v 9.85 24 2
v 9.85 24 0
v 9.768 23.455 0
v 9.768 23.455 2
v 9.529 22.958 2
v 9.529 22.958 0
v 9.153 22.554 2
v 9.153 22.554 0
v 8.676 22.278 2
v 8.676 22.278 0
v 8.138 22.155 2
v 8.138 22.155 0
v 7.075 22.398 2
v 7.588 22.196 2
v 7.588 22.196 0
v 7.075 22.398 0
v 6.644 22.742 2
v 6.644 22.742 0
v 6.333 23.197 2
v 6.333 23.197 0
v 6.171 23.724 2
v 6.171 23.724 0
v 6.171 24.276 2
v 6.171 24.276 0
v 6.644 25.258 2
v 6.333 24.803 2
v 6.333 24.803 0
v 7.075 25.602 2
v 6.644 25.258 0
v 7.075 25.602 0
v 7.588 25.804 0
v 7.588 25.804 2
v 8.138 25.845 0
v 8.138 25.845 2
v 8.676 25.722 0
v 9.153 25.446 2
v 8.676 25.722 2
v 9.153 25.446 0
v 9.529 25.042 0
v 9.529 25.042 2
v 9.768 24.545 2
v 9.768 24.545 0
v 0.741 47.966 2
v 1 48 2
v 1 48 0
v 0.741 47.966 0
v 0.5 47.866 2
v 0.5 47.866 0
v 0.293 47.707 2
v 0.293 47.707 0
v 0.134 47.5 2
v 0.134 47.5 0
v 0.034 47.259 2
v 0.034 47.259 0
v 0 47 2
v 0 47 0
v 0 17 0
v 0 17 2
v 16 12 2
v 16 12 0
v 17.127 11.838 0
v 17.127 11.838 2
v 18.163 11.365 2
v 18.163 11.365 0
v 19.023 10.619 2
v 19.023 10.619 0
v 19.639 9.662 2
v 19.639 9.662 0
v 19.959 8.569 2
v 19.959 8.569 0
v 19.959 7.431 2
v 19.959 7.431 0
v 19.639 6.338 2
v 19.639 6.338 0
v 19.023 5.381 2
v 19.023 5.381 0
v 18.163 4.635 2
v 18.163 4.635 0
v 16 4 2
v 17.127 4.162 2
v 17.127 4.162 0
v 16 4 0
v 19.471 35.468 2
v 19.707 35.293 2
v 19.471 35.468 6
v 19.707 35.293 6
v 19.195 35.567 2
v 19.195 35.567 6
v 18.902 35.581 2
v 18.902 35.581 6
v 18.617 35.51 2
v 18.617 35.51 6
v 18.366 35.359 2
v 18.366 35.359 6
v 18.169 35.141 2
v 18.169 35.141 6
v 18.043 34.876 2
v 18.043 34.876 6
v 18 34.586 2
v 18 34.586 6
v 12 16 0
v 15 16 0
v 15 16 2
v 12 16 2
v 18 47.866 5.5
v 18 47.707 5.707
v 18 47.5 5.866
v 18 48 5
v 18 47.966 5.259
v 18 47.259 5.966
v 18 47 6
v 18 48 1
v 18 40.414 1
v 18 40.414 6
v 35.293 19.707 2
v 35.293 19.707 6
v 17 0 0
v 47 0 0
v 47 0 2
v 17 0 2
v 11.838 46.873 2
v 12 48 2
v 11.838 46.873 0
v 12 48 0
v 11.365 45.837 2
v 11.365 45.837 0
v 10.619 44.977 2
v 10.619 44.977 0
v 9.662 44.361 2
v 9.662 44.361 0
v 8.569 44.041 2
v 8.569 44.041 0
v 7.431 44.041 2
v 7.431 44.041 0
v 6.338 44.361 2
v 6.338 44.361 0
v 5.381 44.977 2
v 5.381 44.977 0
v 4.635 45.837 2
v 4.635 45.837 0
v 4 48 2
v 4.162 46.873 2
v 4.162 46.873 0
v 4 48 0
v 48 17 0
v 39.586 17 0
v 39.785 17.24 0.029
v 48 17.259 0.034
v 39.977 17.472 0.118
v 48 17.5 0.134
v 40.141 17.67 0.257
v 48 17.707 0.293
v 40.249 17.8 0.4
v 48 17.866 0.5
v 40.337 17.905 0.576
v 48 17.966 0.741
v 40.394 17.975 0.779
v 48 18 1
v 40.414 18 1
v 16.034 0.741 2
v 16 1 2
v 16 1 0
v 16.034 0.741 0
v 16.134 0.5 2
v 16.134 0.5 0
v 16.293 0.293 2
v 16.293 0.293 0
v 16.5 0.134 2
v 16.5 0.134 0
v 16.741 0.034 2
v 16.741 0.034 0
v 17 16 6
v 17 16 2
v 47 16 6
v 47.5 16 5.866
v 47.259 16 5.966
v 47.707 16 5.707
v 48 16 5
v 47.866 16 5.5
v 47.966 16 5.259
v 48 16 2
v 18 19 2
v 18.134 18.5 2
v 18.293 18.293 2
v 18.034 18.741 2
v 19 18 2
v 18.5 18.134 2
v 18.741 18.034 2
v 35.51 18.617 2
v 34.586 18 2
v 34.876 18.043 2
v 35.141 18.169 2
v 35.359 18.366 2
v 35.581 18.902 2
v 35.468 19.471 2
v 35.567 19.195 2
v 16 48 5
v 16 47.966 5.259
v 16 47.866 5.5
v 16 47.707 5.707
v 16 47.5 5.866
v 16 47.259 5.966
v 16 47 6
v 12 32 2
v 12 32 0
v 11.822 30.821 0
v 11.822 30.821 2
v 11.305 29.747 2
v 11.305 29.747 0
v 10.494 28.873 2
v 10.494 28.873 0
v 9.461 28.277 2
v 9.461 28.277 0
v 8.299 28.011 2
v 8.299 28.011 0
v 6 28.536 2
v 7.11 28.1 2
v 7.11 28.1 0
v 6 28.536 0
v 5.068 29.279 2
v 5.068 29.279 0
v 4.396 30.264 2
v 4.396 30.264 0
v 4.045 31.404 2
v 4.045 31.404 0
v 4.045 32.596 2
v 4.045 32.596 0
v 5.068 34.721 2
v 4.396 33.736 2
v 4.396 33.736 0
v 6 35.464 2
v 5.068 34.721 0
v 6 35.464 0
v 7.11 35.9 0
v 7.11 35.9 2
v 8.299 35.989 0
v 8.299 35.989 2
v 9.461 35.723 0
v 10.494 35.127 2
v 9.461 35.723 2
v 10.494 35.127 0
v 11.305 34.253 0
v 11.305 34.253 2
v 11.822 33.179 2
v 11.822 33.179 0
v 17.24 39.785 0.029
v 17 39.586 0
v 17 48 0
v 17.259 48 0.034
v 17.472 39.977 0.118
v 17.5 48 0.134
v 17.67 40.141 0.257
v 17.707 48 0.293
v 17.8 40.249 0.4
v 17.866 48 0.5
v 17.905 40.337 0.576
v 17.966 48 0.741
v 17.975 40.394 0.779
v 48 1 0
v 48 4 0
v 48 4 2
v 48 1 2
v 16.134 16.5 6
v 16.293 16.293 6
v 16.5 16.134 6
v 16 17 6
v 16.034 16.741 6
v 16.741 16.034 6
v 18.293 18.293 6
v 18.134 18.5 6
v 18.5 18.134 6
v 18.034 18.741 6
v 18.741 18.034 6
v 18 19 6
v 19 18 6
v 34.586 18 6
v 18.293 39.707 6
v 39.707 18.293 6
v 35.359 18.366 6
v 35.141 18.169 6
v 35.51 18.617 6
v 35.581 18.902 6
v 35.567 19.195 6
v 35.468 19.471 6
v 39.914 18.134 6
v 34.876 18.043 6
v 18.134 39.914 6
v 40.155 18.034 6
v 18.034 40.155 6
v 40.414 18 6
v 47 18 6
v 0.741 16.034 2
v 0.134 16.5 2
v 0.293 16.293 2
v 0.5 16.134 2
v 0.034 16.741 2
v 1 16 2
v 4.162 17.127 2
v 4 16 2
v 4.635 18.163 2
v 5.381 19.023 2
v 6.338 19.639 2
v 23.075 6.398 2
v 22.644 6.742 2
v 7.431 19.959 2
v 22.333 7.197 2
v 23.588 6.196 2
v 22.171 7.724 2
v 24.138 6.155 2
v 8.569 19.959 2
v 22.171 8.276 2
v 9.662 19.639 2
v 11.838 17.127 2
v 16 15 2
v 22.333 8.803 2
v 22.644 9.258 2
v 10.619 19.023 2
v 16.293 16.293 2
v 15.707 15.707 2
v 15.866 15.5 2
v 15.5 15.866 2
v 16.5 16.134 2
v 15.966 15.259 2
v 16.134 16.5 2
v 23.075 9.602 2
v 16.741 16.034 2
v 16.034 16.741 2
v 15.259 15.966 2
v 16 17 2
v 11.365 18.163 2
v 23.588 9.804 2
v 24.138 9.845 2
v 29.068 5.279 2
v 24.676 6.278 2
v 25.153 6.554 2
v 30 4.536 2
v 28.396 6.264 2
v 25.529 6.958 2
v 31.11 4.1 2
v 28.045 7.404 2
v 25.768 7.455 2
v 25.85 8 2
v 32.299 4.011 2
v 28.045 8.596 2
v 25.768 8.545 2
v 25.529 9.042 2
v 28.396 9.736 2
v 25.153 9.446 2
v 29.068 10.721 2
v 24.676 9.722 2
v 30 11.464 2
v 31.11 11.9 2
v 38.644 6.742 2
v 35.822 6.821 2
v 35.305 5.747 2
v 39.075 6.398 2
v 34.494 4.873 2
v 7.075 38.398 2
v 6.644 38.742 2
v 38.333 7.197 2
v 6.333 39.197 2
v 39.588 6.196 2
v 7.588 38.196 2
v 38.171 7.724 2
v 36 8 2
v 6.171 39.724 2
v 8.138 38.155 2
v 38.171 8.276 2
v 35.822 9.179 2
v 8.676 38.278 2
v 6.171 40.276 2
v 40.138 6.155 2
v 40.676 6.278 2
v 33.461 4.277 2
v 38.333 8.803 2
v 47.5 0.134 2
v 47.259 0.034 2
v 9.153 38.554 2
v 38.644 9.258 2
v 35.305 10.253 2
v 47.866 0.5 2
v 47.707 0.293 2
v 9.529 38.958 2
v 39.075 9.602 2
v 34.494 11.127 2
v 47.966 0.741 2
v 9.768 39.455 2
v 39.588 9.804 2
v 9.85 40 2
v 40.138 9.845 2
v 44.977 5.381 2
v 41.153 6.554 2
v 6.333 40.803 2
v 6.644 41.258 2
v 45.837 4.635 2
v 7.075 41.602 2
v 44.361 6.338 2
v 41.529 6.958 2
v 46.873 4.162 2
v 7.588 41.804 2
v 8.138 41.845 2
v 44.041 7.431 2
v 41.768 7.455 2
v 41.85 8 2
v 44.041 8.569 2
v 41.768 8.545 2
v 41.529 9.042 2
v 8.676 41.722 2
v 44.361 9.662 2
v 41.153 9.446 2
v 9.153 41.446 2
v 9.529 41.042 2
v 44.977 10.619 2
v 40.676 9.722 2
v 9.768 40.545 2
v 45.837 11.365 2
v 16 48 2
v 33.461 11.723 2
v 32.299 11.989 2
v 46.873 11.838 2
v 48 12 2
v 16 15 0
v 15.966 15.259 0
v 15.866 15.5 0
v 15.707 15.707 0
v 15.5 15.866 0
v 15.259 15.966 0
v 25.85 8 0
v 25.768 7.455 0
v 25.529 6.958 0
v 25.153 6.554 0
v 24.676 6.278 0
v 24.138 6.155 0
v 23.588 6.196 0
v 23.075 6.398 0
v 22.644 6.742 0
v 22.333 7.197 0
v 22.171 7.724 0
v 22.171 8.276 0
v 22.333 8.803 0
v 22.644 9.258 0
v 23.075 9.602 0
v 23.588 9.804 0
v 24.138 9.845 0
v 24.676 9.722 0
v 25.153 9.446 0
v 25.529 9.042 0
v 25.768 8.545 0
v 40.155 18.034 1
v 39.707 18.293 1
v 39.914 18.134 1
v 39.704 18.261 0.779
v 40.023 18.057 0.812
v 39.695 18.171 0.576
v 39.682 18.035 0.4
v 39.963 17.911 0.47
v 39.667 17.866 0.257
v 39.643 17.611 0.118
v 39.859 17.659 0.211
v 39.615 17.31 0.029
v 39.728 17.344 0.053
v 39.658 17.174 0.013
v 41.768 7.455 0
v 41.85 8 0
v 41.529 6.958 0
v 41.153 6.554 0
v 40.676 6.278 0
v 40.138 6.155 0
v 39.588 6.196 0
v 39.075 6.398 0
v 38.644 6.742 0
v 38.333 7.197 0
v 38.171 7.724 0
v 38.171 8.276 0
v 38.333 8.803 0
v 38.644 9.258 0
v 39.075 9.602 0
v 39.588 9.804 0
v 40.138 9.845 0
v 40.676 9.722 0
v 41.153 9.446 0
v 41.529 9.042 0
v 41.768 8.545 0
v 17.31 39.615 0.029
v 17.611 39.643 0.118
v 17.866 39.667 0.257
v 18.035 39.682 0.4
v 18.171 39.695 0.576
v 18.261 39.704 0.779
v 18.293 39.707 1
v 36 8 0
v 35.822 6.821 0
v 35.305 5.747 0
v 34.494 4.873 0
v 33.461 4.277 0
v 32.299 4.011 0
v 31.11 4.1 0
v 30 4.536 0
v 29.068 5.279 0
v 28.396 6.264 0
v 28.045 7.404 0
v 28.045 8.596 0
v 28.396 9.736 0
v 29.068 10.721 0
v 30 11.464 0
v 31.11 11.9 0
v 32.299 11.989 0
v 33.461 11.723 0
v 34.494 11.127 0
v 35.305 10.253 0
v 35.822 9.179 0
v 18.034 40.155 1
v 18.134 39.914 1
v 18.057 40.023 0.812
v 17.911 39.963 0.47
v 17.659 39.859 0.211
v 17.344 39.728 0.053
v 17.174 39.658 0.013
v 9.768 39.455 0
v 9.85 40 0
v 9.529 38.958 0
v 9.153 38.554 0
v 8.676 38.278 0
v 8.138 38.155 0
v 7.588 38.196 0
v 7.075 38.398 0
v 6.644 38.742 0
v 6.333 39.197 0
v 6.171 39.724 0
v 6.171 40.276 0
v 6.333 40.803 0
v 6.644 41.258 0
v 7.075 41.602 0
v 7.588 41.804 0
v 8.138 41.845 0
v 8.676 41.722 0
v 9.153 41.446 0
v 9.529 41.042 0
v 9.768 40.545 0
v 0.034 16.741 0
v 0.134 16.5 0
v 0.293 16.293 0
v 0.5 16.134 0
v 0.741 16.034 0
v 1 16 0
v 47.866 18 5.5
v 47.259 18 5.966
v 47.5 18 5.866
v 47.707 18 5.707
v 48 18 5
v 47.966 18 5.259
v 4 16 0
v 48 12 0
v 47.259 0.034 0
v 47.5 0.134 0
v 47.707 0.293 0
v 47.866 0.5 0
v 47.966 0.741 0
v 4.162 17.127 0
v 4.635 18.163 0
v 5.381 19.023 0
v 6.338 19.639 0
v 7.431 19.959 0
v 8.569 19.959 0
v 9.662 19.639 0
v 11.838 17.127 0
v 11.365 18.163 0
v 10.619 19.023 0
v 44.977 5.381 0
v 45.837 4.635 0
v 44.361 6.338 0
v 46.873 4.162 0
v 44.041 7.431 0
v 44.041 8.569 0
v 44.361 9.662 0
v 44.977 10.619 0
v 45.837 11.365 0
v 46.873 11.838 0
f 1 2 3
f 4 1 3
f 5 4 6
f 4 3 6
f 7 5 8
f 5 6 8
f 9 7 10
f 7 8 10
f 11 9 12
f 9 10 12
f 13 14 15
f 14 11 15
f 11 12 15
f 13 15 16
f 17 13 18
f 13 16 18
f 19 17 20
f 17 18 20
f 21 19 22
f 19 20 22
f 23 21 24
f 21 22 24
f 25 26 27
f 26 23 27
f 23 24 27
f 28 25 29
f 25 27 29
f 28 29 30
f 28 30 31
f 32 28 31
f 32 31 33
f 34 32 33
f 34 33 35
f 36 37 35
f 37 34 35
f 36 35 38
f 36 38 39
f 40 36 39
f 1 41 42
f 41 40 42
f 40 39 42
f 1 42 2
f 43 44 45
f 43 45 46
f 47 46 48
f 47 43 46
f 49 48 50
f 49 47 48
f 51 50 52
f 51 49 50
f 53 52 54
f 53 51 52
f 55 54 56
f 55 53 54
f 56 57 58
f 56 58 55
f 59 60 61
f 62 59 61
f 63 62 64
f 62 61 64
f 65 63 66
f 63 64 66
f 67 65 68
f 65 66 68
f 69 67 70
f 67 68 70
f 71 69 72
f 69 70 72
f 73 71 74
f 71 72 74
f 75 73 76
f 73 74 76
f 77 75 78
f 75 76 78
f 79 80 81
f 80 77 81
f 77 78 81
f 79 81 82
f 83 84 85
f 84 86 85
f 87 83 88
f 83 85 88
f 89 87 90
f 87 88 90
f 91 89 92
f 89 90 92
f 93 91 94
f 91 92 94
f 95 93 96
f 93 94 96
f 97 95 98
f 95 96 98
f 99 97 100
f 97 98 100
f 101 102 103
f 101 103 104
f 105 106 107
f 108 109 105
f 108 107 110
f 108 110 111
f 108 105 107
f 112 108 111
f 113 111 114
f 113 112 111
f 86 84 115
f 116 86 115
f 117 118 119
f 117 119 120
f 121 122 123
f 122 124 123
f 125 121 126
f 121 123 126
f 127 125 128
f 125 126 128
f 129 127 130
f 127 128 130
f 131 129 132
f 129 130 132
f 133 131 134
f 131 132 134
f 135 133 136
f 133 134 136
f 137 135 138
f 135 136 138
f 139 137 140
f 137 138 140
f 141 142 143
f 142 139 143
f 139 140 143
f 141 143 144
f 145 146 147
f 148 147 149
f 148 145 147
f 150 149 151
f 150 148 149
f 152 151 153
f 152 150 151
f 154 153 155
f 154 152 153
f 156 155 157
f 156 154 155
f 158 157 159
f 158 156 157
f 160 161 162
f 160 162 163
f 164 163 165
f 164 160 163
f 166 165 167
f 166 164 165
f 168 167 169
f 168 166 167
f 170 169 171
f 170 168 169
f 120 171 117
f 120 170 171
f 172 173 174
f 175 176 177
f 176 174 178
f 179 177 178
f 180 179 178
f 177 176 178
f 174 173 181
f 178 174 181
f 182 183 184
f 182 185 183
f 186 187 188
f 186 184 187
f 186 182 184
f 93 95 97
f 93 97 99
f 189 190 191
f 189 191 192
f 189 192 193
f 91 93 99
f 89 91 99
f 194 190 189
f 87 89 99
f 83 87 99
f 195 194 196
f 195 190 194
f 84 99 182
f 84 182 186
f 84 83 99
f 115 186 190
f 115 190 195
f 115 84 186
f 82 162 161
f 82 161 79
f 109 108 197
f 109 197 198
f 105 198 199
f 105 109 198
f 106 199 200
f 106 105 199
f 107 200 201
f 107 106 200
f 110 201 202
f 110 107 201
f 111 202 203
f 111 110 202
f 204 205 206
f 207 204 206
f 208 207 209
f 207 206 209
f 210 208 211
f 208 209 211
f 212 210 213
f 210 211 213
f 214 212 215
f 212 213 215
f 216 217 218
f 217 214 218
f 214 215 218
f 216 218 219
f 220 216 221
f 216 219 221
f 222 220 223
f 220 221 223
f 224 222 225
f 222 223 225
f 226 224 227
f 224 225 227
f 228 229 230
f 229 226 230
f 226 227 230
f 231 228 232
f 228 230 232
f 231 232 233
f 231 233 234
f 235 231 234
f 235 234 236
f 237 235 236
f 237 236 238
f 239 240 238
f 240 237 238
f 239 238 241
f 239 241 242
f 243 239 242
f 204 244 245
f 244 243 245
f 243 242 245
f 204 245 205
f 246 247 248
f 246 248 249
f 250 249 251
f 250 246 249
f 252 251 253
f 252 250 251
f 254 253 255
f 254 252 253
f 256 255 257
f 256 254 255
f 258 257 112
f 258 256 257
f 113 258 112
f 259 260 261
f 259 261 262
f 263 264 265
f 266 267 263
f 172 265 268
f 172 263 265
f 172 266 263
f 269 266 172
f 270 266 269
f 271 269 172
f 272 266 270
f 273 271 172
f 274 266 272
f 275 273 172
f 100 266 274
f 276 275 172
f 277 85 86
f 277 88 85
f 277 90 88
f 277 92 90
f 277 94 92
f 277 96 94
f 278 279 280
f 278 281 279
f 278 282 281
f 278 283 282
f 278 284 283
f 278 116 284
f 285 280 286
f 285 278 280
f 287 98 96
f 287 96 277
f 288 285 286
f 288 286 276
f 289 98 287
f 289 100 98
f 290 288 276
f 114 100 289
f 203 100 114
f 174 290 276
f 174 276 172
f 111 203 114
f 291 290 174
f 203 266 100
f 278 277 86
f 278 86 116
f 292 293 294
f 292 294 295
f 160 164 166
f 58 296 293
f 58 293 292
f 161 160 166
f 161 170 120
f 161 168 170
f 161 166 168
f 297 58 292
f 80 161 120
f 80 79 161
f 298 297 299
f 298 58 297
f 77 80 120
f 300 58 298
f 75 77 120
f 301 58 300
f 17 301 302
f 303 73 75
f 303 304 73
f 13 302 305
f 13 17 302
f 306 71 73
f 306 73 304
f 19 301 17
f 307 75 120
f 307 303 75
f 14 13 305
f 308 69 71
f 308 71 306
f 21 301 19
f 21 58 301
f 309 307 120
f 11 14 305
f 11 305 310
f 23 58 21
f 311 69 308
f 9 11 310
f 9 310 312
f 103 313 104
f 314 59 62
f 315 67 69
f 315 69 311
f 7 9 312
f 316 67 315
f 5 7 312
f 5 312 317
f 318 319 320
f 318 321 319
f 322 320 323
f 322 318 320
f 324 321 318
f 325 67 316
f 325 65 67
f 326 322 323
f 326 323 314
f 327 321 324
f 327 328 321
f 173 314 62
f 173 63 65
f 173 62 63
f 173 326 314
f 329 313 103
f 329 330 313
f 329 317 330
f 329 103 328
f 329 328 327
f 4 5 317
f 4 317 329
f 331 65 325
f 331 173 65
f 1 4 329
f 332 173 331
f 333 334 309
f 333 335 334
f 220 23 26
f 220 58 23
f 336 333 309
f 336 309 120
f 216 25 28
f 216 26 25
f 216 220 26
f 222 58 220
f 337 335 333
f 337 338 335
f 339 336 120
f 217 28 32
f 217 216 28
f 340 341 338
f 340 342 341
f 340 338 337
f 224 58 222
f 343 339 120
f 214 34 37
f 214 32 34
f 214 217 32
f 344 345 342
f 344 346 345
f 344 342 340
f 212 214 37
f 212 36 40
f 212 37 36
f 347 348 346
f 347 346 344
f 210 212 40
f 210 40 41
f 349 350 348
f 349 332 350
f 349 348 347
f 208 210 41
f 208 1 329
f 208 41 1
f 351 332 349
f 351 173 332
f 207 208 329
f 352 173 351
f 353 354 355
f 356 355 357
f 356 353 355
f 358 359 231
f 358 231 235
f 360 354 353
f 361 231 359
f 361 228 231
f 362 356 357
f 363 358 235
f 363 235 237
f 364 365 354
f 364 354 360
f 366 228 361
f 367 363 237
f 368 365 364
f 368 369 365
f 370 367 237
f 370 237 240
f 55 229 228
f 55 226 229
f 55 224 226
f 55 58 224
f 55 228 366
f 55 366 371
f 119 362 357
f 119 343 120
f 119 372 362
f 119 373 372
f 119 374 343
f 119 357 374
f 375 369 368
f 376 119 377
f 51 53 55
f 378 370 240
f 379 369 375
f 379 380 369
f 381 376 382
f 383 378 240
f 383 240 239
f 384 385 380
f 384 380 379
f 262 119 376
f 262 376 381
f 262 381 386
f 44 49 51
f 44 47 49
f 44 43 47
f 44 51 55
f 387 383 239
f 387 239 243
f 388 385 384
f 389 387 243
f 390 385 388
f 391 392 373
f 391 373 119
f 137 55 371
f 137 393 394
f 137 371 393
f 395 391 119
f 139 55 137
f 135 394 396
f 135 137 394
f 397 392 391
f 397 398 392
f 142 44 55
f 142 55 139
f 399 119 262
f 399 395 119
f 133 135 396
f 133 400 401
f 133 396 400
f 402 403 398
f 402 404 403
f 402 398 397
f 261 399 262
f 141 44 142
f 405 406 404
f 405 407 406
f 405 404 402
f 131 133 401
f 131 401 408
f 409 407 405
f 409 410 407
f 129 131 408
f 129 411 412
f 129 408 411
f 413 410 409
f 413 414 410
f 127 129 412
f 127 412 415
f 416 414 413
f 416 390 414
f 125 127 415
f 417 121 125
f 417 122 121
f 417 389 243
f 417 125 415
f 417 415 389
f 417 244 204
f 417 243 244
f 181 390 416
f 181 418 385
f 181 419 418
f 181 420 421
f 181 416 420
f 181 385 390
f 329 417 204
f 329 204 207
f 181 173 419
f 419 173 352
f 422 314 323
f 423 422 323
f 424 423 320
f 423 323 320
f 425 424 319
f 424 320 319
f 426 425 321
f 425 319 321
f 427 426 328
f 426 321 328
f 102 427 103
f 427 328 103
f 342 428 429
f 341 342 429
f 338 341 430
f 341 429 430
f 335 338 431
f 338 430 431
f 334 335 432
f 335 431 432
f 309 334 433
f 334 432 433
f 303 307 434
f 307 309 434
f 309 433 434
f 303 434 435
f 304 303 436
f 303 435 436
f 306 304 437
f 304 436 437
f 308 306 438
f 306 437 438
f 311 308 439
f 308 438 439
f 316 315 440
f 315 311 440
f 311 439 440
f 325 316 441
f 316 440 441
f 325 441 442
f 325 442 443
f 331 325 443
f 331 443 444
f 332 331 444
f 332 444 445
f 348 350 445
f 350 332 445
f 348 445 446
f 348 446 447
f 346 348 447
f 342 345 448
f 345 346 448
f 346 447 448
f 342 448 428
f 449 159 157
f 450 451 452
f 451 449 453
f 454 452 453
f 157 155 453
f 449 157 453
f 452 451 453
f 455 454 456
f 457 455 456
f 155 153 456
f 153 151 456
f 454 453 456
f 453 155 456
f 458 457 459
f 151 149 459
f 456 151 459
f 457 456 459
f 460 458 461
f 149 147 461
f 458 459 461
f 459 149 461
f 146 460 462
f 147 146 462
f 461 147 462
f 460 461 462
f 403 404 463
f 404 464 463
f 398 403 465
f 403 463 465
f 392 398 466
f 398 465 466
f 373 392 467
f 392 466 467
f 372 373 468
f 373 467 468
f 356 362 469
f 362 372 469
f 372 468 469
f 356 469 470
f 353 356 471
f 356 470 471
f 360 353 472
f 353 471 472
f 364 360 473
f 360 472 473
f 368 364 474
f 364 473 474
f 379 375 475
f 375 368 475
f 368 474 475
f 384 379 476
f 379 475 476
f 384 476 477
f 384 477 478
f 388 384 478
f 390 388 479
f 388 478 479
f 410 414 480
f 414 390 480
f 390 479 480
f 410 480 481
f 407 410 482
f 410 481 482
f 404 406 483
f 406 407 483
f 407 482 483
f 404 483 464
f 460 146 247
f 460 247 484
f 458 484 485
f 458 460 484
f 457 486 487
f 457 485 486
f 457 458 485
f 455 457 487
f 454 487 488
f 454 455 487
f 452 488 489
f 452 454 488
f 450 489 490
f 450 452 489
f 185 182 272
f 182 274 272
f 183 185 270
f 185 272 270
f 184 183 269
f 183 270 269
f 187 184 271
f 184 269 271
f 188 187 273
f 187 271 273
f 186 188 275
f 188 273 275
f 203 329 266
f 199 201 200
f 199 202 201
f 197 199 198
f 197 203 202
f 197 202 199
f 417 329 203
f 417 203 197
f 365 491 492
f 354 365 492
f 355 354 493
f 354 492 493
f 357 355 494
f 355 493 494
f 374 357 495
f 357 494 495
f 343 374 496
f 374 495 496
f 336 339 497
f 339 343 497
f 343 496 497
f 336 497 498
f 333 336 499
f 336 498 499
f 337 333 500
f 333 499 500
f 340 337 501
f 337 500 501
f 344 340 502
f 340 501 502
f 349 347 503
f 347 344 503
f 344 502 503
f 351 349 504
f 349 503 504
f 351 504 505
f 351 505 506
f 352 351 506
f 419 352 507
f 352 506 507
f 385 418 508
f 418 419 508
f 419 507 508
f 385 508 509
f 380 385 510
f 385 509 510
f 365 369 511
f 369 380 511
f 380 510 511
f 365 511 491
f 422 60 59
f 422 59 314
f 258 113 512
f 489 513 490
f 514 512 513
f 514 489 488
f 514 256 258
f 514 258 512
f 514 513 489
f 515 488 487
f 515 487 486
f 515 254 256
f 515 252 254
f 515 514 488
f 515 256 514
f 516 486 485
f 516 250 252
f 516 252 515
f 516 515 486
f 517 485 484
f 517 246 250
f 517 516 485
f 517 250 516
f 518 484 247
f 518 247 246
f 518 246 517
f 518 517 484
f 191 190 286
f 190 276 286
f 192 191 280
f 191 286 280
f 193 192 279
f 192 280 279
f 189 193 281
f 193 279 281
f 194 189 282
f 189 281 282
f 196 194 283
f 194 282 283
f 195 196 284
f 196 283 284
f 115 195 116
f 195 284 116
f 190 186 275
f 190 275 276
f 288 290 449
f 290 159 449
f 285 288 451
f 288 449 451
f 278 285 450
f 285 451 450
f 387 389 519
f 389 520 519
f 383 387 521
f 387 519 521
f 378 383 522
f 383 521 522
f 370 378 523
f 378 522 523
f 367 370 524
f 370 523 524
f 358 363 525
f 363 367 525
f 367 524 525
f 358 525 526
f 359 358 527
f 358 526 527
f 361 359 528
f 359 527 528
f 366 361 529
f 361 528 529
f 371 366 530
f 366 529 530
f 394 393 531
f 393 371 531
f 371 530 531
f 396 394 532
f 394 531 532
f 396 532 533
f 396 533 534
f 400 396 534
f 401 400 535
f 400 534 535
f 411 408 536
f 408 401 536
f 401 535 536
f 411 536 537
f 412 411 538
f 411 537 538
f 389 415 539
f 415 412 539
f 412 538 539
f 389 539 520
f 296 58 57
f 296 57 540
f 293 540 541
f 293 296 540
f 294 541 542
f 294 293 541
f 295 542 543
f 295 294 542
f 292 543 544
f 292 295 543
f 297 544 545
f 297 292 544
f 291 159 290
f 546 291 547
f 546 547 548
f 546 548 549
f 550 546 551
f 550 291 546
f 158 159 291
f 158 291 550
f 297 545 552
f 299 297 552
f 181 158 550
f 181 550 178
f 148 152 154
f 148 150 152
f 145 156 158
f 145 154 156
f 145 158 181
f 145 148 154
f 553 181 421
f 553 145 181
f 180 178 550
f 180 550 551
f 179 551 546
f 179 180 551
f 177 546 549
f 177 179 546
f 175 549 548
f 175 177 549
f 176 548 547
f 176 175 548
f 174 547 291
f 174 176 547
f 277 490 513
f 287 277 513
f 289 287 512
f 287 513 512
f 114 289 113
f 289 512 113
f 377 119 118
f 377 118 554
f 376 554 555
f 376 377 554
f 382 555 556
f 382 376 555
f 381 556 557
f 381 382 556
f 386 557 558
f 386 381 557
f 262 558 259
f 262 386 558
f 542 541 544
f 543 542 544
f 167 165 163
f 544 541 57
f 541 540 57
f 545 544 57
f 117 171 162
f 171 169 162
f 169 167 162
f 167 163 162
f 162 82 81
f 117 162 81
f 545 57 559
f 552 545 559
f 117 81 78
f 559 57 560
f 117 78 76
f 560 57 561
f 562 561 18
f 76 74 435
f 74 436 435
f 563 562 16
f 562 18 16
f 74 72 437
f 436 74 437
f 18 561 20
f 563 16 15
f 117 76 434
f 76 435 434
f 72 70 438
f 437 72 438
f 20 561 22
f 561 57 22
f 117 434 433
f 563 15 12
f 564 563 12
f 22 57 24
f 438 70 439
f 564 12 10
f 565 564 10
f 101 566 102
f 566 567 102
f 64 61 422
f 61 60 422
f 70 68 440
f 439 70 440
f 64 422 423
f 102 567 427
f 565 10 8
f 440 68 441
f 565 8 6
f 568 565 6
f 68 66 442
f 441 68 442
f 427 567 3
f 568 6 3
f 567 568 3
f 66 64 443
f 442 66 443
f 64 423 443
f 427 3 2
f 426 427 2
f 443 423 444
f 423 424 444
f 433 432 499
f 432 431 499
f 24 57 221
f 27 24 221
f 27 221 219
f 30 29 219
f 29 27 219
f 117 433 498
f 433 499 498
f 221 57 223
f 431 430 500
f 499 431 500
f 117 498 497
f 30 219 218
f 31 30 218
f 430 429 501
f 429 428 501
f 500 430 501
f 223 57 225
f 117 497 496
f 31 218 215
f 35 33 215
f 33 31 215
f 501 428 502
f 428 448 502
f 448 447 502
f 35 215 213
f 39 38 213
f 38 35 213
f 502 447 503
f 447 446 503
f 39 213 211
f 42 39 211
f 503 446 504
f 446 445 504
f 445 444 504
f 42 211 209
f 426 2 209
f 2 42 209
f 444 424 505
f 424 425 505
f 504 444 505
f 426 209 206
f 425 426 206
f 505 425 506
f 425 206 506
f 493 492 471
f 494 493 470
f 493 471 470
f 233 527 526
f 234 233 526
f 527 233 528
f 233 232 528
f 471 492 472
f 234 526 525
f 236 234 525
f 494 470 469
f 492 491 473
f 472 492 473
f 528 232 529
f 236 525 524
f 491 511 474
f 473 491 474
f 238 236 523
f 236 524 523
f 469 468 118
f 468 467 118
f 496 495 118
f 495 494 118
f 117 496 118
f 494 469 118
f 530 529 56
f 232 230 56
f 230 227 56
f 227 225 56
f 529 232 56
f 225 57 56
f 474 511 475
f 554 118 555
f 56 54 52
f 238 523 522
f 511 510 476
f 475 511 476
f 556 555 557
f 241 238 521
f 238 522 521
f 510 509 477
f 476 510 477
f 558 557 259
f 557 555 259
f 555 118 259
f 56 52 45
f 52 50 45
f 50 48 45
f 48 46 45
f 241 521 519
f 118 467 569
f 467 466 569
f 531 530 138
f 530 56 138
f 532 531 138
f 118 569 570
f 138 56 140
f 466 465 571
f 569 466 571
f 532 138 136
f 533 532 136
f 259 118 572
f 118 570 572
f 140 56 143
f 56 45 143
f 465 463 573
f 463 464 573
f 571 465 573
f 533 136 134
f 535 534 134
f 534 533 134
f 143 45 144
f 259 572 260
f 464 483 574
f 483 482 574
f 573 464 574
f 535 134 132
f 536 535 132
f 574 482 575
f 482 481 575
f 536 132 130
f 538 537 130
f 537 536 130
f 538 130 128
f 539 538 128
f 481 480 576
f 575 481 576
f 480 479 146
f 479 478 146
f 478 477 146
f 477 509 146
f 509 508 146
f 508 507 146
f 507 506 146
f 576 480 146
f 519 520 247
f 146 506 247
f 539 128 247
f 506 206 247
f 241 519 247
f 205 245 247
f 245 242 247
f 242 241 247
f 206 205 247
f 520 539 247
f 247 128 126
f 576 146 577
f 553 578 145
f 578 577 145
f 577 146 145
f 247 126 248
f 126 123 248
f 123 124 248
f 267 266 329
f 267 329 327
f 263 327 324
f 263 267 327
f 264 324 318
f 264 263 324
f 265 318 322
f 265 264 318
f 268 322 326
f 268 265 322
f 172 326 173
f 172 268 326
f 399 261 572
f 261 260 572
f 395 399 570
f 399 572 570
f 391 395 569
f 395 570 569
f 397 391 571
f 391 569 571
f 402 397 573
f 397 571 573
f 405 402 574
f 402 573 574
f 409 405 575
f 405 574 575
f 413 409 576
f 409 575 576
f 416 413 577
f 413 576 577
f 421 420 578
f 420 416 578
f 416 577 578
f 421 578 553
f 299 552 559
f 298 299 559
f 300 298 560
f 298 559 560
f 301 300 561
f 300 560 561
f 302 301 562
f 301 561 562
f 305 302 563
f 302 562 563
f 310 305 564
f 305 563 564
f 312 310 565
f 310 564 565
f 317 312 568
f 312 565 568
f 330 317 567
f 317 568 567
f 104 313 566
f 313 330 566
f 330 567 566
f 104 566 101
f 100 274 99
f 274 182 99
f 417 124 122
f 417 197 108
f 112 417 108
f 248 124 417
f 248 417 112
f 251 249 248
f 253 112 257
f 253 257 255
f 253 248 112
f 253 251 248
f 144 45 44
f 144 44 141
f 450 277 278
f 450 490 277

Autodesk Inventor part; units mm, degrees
ref_plane "YZ Plane" through (0, 0, 0) normal (1, 0, 0) x (0, 1, 0)
ref_plane "XZ Plane" through (0, 0, 0) normal (0, 1, 0) x (-1, 0, 0)
sketch "Эскиз1" plane through (0, 0, 0) normal (0, 0, 1) x (1, 0, 0)
  line L0 (0, 16) -> (0, 48)
  line L1 (0, 48) -> (4, 48)
  arc A0 (4, 48) -> (12, 48) centre (8, 48) ccw
  line L2 (12, 48) -> (18, 48)
  line L3 (18, 48) -> (18, 40)
  line L4 (18, 40) -> (40, 18)
  line L5 (40, 18) -> (48, 18)
  line L6 (48, 18) -> (48, 12)
  arc A1 (48, 12) -> (48, 4) centre (48, 8) ccw
  line L7 (48, 4) -> (48, 0)
  line L8 (48, 0) -> (16, 0)
  line L9 (16, 0) -> (16, 4)
  arc A2 (16, 4) -> (16, 12) centre (16, 8) ccw
  line L10 (16, 12) -> (16, 16)
  line L11 (16, 16) -> (12, 16)
  arc A3 (12, 16) -> (4, 16) centre (8, 16) ccw
  line L12 (0, 16) -> (4, 16)
  circle A4 centre (8, 24) radius 1.85
  circle A5 centre (8, 32) radius 4
  circle A6 centre (8, 40) radius 1.85
  circle A7 centre (40, 8) radius 1.85
  circle A8 centre (32, 8) radius 4
  circle A9 centre (24, 8) radius 1.85
extrude "Выдавливание1" add sketch "Эскиз1" along normal blind 2
fillet "Сопряжение1" radius 1 8 edges at (0, 48, 1) (18, 44, 0) (29, 29, 0) (44, 18, 0) (48, 0, 1) (16, 0, 1) (16, 16, 1) (0, 16, 1)
ref_plane "РабПлоскость1" through (0, 0, 2) normal (0, 0, 1) x (1, 0, 0)
sketch "Эскиз2" plane through (0, 0, 2) normal (0, 0, 1) x (1, 0, 0)
  line L0 (16, 16) -> (16, 48)
  line L1 (16, 48) -> (18, 48)
  line L2 (18, 48) -> (18, 40)
  line L3 (18, 40) -> (40, 18)
  line L4 (40, 18) -> (48, 18)
  line L5 (48, 18) -> (48, 16)
  line L6 (16, 16) -> (48, 16)
  line L7 (18, 18) -> (18, 37)
  line L8 (18, 37) -> (37, 18)
  line L9 (18, 18) -> (37, 18)
extrude "Выдавливание2" add sketch "Эскиз2" along normal blind 4
fillet "Сопряжение2" radius 1 8 edges at (37, 18, 4) (18, 37, 4) (18, 18, 4) (16, 16, 4) (48, 17, 6) (17, 48, 6) (17.7071, 39.8787, 0.2929) (39.8787, 17.7071, 0.2929)
